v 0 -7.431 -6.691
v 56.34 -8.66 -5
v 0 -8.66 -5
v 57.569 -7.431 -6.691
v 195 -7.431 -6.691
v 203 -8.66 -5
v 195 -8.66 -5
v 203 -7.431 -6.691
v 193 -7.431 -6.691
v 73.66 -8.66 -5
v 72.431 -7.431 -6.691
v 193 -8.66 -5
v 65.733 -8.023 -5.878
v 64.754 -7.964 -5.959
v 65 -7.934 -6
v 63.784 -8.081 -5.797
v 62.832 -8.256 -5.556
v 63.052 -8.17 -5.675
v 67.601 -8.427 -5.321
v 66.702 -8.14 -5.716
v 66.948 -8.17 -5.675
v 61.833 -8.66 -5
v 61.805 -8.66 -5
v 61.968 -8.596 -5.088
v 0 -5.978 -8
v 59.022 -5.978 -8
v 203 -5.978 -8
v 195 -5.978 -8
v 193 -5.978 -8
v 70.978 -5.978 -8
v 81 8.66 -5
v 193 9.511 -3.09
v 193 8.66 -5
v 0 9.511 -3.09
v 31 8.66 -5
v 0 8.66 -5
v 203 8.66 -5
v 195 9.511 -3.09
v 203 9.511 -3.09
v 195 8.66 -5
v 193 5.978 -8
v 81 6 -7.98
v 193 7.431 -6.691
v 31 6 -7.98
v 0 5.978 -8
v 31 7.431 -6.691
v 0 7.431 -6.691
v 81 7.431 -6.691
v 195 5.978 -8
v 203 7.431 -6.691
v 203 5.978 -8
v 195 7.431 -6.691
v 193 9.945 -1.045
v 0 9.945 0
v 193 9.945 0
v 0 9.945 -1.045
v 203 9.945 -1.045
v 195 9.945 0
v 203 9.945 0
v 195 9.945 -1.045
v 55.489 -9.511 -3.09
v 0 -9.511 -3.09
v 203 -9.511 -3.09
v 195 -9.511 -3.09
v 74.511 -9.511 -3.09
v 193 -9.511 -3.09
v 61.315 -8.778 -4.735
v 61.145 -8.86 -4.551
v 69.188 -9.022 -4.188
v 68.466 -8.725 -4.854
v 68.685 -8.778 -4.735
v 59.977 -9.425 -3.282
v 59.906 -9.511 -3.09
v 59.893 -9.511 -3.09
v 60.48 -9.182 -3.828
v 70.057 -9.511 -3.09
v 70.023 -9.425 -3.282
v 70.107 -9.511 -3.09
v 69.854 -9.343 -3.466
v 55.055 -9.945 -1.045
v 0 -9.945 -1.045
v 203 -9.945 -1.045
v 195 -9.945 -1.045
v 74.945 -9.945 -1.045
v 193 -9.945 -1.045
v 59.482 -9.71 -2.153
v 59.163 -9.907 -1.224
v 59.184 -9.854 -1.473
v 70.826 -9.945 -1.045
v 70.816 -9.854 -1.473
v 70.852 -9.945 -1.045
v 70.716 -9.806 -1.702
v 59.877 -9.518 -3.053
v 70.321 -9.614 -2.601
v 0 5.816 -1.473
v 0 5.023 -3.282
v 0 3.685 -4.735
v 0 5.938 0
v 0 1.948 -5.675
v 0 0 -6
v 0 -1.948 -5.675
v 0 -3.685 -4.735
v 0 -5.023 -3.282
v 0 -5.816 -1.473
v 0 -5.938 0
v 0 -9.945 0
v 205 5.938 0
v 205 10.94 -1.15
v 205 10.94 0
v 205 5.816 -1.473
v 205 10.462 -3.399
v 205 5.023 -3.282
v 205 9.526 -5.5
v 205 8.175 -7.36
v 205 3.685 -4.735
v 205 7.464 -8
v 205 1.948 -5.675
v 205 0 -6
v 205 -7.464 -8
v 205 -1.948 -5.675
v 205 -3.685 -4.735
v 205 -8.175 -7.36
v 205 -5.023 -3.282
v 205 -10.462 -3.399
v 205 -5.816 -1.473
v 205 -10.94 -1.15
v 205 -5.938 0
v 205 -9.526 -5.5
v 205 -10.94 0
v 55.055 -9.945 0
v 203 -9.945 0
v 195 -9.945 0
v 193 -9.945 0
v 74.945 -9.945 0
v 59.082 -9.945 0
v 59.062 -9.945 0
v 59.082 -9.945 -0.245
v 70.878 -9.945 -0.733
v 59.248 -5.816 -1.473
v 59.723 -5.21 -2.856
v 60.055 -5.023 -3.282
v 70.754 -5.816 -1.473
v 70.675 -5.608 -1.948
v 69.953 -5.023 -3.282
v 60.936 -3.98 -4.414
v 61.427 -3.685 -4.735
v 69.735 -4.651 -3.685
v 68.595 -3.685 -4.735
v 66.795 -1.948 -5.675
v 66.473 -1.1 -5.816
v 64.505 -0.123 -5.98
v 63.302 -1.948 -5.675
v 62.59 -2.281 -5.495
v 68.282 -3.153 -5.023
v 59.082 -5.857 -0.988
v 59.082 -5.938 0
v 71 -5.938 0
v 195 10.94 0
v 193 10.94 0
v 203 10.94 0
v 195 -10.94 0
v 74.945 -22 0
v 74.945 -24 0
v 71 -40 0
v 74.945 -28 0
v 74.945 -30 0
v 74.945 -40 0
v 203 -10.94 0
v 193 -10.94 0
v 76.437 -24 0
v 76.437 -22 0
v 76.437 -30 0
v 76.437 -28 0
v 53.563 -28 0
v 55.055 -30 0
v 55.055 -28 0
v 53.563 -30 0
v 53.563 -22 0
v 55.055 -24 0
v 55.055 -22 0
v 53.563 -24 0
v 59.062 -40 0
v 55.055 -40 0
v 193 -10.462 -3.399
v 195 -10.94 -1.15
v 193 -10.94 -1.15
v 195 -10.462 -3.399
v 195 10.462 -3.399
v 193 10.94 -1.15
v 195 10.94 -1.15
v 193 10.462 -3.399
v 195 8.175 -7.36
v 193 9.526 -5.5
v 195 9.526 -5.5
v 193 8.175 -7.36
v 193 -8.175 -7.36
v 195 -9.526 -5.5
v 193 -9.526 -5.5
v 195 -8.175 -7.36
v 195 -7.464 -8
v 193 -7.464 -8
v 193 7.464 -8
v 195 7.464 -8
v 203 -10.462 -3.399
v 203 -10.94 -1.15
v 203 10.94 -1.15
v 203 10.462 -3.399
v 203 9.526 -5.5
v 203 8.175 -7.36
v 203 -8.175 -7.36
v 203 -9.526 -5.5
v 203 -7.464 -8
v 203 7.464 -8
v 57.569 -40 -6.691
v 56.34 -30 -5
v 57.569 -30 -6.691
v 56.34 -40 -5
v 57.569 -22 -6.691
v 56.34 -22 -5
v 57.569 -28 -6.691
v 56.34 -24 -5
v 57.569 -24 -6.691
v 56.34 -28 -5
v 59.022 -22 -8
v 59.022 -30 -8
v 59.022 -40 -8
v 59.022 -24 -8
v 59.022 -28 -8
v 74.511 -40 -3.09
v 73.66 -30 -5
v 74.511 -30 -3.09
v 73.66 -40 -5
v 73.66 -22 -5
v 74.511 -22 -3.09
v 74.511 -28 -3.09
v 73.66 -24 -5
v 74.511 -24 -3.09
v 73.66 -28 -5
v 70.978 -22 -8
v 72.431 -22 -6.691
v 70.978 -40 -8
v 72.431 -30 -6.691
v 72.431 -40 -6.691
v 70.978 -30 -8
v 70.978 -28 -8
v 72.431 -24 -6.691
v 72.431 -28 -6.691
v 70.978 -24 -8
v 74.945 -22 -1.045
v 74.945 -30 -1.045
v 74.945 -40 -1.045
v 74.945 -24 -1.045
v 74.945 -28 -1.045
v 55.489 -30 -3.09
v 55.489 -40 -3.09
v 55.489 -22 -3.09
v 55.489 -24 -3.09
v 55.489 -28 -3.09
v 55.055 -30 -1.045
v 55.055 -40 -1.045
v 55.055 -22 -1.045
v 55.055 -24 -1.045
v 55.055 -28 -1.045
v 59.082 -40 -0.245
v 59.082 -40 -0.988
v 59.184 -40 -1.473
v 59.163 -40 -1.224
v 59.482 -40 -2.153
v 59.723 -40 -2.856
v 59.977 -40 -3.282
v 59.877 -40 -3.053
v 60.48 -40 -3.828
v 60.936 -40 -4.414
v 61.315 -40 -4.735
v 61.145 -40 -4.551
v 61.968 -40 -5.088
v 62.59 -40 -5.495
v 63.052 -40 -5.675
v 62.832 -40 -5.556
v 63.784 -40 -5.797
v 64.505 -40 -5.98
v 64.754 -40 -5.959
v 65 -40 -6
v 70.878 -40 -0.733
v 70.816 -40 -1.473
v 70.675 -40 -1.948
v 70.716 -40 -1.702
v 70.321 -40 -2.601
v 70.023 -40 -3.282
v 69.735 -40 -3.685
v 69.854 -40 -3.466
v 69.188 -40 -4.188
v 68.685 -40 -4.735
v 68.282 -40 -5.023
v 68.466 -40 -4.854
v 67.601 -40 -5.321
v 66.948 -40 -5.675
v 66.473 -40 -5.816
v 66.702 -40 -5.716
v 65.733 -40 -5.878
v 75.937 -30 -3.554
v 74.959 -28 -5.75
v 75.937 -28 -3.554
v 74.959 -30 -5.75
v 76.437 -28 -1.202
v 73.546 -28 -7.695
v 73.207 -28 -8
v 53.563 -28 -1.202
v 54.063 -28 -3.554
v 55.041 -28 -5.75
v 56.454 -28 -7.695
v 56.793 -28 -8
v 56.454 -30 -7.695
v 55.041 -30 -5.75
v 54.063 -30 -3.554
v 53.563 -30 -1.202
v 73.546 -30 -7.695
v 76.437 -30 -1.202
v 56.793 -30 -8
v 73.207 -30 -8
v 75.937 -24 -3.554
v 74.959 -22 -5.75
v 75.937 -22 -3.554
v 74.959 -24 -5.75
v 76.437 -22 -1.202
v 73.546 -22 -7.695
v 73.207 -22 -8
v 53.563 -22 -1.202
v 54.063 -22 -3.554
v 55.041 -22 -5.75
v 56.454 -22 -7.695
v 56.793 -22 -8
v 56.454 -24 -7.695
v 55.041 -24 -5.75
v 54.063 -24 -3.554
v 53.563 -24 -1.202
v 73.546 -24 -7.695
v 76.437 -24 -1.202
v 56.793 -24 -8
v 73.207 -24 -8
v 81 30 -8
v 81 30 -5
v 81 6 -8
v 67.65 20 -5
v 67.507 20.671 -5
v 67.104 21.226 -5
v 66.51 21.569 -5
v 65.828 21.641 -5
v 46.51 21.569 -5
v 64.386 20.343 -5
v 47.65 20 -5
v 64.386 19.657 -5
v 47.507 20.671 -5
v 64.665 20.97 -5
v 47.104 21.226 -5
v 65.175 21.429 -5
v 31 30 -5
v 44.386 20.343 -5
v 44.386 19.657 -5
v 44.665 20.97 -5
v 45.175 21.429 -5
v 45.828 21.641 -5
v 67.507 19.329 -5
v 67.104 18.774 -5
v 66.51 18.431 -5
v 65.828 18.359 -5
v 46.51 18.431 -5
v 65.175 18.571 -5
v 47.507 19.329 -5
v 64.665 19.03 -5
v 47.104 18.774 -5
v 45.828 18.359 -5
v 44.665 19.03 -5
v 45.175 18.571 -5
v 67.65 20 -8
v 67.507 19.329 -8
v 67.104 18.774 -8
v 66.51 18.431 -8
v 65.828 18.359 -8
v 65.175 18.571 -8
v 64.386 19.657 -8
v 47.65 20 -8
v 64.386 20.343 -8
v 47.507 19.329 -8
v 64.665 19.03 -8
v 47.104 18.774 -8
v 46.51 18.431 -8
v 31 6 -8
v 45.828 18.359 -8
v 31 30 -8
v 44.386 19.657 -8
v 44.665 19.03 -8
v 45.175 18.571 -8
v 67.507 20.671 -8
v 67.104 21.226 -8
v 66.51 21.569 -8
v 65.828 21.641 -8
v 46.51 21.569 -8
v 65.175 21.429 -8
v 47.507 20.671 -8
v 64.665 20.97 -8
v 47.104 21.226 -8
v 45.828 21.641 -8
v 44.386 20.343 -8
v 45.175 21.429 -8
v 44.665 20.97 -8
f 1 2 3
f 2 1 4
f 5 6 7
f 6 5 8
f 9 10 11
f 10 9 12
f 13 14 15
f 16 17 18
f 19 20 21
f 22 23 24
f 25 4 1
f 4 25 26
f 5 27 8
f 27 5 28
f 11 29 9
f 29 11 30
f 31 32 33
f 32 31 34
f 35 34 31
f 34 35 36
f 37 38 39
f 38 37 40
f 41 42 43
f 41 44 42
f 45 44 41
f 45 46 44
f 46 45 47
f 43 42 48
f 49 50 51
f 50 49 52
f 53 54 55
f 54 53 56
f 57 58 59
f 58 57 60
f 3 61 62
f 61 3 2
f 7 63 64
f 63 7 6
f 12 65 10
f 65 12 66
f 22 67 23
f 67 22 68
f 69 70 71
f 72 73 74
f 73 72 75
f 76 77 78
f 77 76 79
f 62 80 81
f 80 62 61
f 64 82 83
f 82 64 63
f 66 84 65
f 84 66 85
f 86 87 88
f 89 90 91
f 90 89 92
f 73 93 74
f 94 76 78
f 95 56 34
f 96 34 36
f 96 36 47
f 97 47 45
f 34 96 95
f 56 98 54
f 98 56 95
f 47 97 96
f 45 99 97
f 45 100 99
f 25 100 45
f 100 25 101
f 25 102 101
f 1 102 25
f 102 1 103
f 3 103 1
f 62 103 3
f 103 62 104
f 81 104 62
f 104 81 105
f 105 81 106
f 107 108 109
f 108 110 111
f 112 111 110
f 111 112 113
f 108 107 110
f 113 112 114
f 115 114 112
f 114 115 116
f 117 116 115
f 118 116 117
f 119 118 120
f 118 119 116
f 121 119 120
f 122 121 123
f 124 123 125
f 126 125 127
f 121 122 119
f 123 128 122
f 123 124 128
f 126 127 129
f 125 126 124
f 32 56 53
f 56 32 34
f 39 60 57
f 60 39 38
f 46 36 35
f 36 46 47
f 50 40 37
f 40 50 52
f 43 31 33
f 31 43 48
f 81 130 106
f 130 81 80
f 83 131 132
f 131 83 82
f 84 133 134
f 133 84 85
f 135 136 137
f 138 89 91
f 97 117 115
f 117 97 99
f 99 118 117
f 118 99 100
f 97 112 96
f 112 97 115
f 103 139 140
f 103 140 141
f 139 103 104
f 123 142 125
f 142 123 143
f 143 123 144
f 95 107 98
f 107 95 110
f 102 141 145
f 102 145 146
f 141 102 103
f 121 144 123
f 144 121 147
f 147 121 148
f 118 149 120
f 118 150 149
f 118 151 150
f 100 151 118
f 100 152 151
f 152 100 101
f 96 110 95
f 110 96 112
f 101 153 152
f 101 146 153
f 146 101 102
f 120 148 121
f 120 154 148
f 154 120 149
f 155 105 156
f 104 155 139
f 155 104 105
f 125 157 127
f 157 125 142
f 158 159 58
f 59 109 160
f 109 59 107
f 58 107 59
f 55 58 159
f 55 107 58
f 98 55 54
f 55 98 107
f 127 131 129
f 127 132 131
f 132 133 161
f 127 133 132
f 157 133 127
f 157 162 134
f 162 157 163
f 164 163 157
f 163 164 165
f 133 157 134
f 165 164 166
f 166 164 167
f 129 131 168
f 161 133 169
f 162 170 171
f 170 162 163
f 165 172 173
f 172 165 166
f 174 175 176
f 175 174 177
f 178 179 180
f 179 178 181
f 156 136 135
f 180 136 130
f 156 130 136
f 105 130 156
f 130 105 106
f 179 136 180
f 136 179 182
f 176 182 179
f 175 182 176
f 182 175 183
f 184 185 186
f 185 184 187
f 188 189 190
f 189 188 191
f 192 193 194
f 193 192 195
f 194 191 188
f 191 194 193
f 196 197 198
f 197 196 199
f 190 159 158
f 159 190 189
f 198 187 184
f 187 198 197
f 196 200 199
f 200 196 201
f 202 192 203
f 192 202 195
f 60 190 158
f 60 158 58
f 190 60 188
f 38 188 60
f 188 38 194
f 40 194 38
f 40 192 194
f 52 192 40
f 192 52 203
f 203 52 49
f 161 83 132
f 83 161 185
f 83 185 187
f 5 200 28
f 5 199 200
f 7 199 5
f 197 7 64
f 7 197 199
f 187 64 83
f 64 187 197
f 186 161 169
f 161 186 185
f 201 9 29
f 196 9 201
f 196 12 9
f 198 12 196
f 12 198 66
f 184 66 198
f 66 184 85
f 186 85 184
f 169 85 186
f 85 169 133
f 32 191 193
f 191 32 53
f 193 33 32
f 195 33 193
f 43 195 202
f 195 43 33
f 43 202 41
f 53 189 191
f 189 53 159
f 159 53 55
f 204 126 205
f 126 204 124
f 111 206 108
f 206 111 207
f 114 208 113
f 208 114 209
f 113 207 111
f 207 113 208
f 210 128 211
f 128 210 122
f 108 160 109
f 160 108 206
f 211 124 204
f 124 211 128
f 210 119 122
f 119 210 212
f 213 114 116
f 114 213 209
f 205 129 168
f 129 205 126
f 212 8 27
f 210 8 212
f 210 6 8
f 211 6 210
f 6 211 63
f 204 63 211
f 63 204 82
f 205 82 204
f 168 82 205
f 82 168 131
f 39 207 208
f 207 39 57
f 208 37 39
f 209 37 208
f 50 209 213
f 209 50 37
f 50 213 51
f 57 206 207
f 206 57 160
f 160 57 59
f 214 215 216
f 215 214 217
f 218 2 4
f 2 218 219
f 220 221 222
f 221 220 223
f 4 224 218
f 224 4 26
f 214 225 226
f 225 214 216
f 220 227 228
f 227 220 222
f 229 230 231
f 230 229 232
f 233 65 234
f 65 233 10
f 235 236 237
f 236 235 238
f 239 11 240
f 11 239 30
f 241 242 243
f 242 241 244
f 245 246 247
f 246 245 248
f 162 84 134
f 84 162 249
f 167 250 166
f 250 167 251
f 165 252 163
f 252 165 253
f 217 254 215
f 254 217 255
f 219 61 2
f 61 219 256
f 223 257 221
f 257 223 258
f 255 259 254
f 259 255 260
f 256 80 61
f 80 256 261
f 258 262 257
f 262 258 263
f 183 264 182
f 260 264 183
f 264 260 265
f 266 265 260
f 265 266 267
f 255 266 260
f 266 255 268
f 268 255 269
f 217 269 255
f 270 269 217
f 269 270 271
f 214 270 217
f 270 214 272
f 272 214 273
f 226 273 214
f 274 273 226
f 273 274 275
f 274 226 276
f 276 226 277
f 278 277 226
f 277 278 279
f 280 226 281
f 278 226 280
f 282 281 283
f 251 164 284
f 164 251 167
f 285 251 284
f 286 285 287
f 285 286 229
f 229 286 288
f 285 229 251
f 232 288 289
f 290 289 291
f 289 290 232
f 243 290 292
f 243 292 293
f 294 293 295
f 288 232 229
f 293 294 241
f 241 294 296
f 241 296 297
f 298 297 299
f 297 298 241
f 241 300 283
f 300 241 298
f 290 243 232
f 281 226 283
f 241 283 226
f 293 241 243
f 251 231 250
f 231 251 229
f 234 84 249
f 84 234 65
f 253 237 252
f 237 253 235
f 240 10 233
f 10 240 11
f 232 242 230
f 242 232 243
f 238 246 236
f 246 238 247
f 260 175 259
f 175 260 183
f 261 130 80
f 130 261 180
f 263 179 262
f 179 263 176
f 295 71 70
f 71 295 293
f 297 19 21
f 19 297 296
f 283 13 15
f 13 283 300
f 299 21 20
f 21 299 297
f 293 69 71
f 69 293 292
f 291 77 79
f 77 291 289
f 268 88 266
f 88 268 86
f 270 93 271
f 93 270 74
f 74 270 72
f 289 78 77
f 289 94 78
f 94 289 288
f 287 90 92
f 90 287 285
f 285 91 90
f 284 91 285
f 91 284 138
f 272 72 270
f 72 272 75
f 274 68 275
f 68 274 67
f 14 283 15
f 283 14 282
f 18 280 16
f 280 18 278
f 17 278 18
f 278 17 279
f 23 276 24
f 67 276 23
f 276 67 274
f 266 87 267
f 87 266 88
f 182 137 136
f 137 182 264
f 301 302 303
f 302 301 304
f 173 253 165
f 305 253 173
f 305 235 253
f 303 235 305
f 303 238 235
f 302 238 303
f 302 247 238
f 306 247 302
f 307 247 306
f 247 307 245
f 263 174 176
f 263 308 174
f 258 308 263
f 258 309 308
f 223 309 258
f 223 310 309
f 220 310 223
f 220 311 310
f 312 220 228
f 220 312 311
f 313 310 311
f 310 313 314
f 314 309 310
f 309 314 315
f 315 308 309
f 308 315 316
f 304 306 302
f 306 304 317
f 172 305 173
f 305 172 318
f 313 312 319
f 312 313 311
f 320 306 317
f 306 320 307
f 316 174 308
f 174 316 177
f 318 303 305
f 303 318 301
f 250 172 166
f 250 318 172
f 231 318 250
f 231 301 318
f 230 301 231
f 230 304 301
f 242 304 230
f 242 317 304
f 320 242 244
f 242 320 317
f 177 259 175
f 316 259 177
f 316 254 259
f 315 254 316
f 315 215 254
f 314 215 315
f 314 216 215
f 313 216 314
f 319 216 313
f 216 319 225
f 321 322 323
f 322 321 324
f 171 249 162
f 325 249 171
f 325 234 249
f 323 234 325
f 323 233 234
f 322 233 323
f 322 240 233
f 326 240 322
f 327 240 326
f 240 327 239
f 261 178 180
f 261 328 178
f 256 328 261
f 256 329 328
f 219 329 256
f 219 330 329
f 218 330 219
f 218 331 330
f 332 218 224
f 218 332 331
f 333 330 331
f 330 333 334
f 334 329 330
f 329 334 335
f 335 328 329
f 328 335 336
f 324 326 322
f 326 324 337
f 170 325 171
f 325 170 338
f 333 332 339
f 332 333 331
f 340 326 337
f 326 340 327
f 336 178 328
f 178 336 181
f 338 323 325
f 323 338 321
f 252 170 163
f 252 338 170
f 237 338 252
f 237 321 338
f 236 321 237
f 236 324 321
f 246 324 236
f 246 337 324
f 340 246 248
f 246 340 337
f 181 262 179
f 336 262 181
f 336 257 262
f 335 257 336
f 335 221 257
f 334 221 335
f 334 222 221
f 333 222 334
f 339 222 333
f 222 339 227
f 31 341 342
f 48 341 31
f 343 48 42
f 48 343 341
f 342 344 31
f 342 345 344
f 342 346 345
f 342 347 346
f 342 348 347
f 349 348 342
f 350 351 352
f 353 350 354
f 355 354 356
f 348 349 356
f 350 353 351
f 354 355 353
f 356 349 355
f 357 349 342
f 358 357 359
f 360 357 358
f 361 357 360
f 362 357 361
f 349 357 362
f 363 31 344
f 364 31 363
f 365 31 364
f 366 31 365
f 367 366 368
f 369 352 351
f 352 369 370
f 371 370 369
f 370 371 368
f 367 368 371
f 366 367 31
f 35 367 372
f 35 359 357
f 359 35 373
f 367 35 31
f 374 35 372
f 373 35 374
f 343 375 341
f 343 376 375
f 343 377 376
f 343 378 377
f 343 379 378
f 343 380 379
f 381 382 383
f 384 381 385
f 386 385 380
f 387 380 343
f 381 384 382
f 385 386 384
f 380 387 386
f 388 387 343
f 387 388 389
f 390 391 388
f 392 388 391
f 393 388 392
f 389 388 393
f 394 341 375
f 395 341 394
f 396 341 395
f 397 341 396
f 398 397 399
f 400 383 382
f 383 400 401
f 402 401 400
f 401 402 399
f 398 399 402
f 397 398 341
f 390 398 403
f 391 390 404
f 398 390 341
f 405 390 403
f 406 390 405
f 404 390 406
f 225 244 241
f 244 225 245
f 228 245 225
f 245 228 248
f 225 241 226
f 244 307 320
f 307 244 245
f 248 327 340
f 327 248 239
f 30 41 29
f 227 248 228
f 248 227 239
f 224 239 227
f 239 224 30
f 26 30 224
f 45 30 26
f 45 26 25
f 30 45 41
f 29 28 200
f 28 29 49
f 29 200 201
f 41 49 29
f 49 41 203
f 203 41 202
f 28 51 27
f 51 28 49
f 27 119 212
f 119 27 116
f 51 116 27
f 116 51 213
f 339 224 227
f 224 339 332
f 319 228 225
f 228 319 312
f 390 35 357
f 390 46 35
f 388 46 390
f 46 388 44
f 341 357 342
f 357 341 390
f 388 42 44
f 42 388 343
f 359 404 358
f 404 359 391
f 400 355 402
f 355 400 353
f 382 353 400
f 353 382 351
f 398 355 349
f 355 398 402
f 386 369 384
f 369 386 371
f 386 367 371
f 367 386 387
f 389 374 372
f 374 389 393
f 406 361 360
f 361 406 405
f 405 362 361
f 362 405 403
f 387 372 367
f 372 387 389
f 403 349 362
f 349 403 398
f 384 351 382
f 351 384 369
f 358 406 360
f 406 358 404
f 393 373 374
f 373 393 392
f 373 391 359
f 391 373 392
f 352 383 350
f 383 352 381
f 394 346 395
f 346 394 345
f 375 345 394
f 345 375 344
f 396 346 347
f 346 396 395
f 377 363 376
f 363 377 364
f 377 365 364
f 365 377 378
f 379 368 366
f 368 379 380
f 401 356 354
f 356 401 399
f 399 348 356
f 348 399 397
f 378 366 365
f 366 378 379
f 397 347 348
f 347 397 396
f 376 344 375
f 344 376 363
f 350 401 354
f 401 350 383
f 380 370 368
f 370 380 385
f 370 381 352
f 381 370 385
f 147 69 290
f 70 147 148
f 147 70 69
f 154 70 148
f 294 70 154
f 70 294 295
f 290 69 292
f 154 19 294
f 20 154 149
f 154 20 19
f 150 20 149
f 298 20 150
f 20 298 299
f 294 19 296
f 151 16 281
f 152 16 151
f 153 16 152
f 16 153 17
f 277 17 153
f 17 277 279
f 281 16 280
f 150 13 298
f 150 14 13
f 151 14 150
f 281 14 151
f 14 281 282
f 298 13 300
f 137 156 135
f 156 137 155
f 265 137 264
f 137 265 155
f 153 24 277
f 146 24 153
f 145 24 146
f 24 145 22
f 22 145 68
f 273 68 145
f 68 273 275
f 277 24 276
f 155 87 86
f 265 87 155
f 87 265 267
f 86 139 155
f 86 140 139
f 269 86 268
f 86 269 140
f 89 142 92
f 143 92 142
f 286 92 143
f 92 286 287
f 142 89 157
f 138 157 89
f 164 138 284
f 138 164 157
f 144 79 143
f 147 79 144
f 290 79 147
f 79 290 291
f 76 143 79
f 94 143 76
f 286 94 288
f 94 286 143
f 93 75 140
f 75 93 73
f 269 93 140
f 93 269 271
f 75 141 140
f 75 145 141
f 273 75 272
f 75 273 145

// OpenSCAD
m3_bolt_d = 3.3;

module cable_mount(cable_len, out_d, in_d){
    rotate([0, 90, 0 ]){
    difference(){
        cylinder(d=out_d, h=cable_len);
        cylinder(d=in_d, h=cable_len);
        translate([-out_d/2, 0, cable_len/2])
            cube([out_d, out_d, cable_len], center=true);
        }
    }
}


module plate_mount_top(y_offset, thickness=2){
    difference(){
        translate([-5, 0, 0]){
            cube([50, 25, thickness]);
            cube([15, 7, thickness*2]);
            translate([35, 0, 0, ])
                cube([15, 7, thickness*2]);
        }
        translate([10, y_offset, 0])
            cylinder(d=m3_bolt_d, h=10, $fn=15);
        translate([30, y_offset, 0])
            cylinder(d=m3_bolt_d, h=10, $fn=15);
    }
    
}

module plate_mount(y_offset, thickness=2){
    difference(){
        translate([-5, 0, 0]) cube([50, 24, thickness]);
        translate([10, y_offset, 0])
            cylinder(d=m3_bolt_d, h=10, $fn=15);
        translate([30, y_offset, 0])
            cylinder(d=m3_bolt_d, h=10, $fn=15);
    }
    
}


module bottom_wire_holder(){
    inner_pipe_d = 12;
    outer_d = 20;
    vert_pipe_offset = 65;
    vert_pipe_len = 40;
    heated_bed_connector = 205;
    bottom_shave_offset = 2;
    difference(){
        union(){
            cable_mount(heated_bed_connector, outer_d, inner_pipe_d);
            translate([heated_bed_connector - 12, 0, 0])
                cable_mount(2, outer_d+2, inner_pipe_d);
            translate([heated_bed_connector - 2 , 0, 0])
                cable_mount(2, outer_d+2, inner_pipe_d);
            // vertical pipe #1
            translate([vert_pipe_offset, 0 , 0]){
                rotate([0,0,270]){
                    cable_mount(vert_pipe_len, outer_d , inner_pipe_d);
                    translate([28, 0, 0])
                        cable_mount(2, outer_d + 3, inner_pipe_d + 5);
                    translate([22, 0, 0])
                        cable_mount(2, outer_d + 3, inner_pipe_d + 5);
                }
            }
            // vertical pipe #2
            /*
            pipe_2 = 60;
            translate([vert_pipe_offset + 60, 0 , 0]){
                rotate([0,0,270]){
                    cable_mount(pipe_2, outer_d, inner_pipe_d);
                    translate([pipe_2, 0, 0])
                        cable_mount(2, outer_d+2, inner_pipe_d);
                    translate([pipe_2 - 10, 0, 0])
                        cable_mount(2, outer_d+2, inner_pipe_d);
                }
            }
            */
            translate([36, 6, -outer_d/2 + 2])
                plate_mount(14, 3);
        }
        // horizontal cutout
        rotate([0, 90, 0 ])
            cylinder(d=inner_pipe_d, h=heated_bed_connector);
        // vertical pipe cutout #1
        
        translate([vert_pipe_offset, 0, 0])
            rotate([90, 0, 0 ])
                cylinder(d=inner_pipe_d, h=vert_pipe_len);
        // vertical pipe cutout #2
        /*
        translate([vert_pipe_offset + 60, 20, 0])
            rotate([90, 0, 0 ])
                cylinder(d=inner_pipe_d, h=heated_bed_connector);
        */
        //shave off bottom
        
        translate([0, -70, -outer_d + bottom_shave_offset])
            cube([heated_bed_connector, 100, 10]);
        
    }
}

module top_wire_holder(){
    translate([0,-2,-10]){
        difference() {
            plate_mount_top(15, 3);
            translate([20, 7, 10]){
                rotate([90, 0, 0])
                cylinder(d=20, h=8);
            }
        }
    }
    difference(){
        union(){
            
            translate([20, -55, 0])
                rotate([0, 0, 90])
                    cable_mount(60, 25, 17);
            rotate([0,0,270]){
                translate([50, 20, 0])
                    cable_mount(2, 28, 17);
                translate([42, 20, 0])
                    cable_mount(2, 28, 17);
                translate([34, 20, 0])
                    cable_mount(2, 28, 17);
                translate([8, 20, 0])
                    cable_mount(2, 28, 17);
            }
        }
        translate([0,-75, -20])
            cube([40, 80, 10]);
    }
}

//plate_mount();
bottom_wire_holder();
//top_wire_holder();
